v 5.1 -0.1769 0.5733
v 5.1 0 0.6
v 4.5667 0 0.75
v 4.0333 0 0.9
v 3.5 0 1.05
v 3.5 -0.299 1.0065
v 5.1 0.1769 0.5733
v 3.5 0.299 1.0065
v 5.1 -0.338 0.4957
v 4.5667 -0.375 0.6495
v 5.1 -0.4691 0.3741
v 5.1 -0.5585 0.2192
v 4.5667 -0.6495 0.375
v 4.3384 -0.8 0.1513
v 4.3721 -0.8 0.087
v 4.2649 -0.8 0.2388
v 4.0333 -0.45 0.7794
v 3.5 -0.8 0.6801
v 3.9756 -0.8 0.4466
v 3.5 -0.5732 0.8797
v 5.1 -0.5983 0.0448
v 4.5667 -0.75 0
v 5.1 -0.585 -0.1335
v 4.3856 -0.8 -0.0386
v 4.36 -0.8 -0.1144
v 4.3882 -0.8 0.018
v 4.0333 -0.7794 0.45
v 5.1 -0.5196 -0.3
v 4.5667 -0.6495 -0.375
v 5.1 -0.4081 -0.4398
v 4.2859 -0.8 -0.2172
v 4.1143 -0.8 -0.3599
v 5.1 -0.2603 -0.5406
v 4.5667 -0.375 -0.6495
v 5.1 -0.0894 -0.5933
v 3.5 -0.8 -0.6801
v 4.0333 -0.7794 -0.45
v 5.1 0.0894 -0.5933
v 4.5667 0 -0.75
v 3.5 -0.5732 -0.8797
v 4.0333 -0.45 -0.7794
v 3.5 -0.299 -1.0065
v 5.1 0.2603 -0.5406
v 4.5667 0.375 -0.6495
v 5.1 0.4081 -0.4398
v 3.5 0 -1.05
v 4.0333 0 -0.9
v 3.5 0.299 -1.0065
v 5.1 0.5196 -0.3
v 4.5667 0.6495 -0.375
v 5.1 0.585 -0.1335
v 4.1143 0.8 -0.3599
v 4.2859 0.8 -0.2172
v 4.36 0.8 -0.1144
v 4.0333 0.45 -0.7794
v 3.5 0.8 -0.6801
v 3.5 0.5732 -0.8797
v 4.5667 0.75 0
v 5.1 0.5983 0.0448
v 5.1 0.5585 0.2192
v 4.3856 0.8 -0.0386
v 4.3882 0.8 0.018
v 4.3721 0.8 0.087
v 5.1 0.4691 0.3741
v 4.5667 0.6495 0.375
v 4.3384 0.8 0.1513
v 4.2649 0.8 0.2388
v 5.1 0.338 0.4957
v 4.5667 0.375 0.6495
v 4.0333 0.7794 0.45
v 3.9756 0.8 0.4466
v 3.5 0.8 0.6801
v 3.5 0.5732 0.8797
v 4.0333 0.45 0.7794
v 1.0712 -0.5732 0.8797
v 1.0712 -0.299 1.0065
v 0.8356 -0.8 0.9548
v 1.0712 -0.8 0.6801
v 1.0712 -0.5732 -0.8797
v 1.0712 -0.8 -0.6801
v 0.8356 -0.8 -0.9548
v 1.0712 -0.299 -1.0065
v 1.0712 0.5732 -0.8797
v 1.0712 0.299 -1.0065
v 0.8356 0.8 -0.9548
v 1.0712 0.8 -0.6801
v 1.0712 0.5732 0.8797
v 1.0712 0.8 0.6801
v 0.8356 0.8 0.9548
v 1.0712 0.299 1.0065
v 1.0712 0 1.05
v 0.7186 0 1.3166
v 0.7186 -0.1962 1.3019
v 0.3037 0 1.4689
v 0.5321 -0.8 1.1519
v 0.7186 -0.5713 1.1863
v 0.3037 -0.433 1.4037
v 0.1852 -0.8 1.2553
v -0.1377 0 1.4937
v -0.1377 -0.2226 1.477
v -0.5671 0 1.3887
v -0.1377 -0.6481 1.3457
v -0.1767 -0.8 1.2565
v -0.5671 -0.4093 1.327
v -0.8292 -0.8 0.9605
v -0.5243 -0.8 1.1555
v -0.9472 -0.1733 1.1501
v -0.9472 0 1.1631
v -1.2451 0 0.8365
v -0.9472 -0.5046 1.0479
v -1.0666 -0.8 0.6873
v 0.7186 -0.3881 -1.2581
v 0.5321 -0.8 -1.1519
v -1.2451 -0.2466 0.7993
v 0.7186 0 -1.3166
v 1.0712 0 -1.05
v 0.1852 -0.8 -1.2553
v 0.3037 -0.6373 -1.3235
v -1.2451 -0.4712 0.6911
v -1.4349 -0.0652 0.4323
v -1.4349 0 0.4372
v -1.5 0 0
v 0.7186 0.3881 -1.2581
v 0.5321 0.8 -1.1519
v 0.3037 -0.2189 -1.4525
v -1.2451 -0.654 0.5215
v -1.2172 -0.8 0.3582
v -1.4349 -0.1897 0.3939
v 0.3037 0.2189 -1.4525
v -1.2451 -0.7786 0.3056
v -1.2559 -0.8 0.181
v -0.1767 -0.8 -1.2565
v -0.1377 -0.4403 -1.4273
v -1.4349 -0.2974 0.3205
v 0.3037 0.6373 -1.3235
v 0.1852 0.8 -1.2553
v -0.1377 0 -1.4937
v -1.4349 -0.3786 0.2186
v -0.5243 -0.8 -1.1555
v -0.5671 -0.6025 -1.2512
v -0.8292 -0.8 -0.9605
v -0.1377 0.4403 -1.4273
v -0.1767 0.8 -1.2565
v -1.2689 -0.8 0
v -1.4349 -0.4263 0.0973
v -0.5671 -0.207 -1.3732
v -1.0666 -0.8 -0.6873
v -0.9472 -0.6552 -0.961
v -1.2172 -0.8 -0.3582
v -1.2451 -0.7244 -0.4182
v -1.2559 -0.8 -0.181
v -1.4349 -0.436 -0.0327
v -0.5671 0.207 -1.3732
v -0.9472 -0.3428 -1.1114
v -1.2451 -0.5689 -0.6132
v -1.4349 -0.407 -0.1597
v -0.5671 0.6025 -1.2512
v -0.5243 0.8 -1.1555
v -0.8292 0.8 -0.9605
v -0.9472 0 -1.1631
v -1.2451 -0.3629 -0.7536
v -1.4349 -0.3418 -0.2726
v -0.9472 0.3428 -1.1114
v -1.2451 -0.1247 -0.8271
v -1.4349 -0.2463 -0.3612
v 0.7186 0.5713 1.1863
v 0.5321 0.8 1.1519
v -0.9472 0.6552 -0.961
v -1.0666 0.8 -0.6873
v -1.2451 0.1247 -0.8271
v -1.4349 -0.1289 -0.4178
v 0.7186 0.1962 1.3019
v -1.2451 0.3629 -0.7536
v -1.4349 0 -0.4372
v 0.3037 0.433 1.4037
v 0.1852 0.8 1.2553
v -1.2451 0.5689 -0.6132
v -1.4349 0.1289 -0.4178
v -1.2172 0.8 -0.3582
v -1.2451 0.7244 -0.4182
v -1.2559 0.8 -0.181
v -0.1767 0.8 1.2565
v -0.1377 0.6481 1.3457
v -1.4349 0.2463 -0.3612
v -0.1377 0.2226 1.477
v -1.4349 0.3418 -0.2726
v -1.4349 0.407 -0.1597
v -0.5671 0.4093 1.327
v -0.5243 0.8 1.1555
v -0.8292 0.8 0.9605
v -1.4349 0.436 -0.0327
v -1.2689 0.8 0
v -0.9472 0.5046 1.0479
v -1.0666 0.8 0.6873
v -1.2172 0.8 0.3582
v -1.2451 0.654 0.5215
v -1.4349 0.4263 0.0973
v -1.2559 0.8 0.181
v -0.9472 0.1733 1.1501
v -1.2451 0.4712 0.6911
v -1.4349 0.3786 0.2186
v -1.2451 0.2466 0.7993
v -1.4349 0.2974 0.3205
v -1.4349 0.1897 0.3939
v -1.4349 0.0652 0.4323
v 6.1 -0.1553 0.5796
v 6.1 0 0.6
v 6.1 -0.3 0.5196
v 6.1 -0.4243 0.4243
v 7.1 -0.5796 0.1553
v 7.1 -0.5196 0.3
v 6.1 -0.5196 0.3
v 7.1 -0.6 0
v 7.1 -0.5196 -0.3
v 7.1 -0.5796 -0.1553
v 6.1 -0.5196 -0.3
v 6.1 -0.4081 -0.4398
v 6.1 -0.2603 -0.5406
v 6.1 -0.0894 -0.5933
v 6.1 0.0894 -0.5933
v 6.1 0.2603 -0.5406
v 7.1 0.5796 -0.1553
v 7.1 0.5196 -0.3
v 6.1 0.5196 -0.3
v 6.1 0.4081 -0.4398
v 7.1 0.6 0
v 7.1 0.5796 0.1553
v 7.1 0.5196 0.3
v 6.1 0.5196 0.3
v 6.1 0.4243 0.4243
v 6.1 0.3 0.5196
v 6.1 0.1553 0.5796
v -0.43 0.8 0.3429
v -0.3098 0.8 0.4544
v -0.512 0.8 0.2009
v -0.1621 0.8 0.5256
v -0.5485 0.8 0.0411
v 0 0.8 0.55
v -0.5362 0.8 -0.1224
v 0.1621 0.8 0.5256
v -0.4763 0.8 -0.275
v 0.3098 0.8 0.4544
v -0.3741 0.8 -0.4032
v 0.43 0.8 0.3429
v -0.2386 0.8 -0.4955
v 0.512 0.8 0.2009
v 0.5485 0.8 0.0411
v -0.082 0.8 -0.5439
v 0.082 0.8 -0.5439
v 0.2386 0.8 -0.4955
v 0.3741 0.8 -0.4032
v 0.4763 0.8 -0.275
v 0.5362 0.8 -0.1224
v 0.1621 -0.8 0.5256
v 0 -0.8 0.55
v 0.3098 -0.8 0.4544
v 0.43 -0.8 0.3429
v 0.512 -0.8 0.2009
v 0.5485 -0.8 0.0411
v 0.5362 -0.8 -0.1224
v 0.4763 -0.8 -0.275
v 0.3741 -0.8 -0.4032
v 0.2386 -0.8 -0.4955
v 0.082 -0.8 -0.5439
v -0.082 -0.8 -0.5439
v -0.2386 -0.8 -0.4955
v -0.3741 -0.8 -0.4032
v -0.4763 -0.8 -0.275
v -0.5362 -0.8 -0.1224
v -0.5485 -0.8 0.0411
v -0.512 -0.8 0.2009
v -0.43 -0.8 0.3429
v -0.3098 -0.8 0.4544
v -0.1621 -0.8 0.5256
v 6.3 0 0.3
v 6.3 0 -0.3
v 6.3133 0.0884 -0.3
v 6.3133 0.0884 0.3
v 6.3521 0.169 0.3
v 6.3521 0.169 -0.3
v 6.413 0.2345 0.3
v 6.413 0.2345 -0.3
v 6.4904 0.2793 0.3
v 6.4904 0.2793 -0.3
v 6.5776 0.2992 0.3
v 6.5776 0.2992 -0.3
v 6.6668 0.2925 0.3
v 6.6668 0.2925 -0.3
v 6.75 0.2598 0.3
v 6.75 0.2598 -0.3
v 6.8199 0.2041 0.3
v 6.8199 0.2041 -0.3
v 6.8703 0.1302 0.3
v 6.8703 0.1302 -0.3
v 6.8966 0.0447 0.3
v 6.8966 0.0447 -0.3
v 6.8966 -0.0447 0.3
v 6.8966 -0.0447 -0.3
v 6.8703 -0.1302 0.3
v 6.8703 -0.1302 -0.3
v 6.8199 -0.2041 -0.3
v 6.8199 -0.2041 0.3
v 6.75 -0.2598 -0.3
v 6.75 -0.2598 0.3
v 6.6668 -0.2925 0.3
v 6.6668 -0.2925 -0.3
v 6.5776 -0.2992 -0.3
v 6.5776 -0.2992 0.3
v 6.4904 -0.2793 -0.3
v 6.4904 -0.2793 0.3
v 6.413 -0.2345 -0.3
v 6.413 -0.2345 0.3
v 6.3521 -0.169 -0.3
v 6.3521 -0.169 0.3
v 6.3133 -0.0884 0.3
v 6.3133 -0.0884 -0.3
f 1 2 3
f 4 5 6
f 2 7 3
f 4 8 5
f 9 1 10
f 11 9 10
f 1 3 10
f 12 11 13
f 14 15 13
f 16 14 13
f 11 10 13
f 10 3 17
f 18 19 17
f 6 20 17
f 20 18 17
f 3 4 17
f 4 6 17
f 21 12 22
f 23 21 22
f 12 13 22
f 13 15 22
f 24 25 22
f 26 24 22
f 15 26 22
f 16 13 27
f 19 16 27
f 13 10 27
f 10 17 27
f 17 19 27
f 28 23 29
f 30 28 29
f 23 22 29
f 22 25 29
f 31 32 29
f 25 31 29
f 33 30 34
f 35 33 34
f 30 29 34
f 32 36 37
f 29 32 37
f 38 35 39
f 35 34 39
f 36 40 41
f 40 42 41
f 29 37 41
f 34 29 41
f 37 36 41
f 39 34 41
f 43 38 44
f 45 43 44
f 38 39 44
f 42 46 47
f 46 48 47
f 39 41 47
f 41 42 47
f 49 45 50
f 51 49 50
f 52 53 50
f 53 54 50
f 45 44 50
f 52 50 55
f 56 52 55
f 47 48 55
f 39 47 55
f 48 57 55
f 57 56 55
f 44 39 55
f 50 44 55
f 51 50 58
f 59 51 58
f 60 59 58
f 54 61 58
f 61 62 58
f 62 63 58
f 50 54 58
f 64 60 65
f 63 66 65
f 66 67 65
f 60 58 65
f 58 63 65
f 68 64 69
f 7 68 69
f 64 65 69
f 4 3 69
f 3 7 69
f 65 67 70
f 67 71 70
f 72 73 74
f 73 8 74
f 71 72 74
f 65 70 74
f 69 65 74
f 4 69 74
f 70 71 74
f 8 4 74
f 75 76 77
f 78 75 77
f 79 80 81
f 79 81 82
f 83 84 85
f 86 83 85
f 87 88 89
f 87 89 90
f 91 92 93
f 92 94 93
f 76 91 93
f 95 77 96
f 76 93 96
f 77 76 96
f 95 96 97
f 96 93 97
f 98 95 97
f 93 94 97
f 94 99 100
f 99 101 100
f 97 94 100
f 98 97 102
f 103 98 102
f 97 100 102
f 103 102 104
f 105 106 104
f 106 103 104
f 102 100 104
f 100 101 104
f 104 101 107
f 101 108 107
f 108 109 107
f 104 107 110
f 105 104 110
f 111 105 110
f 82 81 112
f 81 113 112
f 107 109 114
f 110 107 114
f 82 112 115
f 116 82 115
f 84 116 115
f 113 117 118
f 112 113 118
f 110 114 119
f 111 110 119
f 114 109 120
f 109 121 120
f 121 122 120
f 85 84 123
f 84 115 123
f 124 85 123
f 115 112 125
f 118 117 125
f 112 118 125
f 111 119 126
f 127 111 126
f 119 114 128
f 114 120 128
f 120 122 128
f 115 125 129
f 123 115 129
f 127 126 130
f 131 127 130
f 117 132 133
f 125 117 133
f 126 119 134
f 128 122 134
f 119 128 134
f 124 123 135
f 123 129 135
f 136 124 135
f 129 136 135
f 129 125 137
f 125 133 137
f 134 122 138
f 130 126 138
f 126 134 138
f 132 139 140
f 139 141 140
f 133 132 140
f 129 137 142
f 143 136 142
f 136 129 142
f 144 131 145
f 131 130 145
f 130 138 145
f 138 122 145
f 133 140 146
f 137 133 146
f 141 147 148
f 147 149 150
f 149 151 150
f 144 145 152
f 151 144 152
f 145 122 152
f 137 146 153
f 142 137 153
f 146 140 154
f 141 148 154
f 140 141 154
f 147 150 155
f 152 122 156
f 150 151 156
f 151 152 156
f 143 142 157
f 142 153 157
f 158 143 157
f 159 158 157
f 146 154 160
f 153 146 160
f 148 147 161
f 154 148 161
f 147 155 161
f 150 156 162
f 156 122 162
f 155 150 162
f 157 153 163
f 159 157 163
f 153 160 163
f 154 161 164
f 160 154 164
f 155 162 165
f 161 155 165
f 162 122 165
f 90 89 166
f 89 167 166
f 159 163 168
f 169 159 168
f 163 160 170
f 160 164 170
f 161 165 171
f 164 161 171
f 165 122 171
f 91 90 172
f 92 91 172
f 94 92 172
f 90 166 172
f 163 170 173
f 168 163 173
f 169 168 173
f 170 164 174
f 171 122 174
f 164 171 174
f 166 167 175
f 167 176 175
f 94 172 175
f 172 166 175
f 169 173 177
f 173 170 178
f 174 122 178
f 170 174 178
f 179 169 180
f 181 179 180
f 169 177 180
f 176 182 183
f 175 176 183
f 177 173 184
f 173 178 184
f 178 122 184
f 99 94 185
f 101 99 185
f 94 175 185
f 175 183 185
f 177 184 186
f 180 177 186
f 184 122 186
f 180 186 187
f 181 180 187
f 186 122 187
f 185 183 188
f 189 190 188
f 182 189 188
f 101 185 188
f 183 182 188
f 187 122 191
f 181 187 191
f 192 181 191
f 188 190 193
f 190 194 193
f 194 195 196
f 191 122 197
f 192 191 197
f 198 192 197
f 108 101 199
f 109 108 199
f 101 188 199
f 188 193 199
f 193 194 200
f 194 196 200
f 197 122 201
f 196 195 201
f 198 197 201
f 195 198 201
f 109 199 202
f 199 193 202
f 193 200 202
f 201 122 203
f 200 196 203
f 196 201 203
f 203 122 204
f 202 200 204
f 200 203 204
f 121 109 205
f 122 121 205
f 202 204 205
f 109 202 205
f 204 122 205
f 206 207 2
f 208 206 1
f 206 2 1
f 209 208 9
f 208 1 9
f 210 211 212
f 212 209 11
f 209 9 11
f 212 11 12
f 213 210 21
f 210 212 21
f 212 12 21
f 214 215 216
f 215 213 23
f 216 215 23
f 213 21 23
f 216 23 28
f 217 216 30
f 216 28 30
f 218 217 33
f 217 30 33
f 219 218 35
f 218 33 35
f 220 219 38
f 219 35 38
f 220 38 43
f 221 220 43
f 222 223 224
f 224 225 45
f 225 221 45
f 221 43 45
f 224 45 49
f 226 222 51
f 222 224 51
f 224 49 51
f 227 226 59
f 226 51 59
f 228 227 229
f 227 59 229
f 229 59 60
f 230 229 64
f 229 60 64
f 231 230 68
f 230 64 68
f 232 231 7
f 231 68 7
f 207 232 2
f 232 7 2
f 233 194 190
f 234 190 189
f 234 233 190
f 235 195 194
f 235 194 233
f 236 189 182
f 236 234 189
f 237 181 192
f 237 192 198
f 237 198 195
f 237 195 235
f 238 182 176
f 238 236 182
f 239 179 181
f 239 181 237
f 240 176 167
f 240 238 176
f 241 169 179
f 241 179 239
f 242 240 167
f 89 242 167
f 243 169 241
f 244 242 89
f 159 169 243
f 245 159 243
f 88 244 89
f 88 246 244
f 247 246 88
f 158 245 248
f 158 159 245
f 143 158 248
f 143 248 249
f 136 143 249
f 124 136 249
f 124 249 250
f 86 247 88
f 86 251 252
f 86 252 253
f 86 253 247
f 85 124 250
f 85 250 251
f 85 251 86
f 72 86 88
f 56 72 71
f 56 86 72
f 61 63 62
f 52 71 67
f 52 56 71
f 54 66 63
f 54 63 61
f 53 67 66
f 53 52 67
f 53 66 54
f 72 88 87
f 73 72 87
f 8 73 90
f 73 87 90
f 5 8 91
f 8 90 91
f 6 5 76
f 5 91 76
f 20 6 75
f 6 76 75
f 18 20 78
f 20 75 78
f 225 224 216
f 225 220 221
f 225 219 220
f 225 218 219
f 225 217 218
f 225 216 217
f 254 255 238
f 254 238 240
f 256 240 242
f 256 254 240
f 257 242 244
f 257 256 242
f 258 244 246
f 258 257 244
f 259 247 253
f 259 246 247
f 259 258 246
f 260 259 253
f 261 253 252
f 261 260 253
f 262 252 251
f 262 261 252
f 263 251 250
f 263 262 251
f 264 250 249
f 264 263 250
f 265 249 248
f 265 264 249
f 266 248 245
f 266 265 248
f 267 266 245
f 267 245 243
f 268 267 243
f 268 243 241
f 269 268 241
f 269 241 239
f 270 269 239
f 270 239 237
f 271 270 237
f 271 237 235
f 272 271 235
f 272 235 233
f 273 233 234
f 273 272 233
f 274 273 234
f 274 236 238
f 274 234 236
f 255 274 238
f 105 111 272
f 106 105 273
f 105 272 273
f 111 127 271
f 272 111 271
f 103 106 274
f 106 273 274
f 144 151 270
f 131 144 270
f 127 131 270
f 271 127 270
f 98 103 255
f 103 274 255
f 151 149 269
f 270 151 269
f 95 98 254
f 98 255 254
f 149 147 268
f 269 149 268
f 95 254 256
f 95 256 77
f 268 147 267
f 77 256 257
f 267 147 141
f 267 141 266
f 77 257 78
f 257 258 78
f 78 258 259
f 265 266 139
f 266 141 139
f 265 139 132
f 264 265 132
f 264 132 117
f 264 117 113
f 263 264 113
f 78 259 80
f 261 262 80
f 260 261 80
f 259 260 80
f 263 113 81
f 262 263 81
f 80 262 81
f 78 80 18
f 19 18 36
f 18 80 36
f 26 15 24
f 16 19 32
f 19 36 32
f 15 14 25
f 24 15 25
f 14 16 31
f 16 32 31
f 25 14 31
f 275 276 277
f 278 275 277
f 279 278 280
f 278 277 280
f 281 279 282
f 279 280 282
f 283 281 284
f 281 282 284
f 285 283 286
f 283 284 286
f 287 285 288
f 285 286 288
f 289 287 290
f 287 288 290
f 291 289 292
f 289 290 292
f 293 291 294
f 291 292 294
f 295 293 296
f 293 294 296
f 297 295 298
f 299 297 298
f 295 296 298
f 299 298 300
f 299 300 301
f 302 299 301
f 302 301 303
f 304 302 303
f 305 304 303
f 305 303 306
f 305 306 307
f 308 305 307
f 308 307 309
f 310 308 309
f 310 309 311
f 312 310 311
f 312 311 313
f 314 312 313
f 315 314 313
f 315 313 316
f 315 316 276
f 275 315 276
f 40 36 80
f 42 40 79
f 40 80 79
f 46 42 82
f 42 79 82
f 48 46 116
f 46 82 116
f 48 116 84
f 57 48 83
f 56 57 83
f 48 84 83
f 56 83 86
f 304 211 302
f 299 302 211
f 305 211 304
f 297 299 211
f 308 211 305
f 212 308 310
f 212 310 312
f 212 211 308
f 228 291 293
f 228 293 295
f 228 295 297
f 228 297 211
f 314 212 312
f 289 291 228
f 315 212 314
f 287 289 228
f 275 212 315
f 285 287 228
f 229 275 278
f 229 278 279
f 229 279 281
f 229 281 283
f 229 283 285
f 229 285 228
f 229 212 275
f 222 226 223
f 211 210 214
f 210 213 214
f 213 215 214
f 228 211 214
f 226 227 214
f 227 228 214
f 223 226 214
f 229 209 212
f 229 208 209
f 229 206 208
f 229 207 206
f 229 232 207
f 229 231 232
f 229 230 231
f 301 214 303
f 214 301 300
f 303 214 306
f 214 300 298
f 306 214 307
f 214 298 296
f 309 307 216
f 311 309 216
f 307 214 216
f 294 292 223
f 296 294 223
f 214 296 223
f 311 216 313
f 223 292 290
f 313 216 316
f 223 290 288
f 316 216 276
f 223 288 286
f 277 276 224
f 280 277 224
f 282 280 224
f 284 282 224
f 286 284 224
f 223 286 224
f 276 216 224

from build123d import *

# Parameters (mm, degrees)
CUT_EXTRUDE_START         = -1.5
CUT_EXTRUDE_1_OUTLINE_W   = 9
CUT_EXTRUDE_1_OUTLINE_H   = 6
CUT_EXTRUDE_1_DEPTH       = 0.7
CUT_EXTRUDE_START_2       = 0.8
CUT_EXTRUDE_1_2_OUTLINE_W = 9
CUT_EXTRUDE_1_2_OUTLINE_H = 6
CUT_EXTRUDE_1_2_DEPTH     = 0.7
CUT_EXTRUDE_2_DEPTH       = 8.431016081
CUT_EXTRUDE_2_DEPTH_BACK  = 8.431016081
SKETCH_4_R                = 0.55
CUT_EXTRUDE_3_DEPTH       = 9.766413178
CUT_EXTRUDE_3_DEPTH_BACK  = 1
SKETCH_5_OUTSIDE_W        = 6.85
SKETCH_5_OUTSIDE_H        = 5.45
SKETCH_5_OUTSIDE_W_2      = 0.6
SKETCH_5_OUTSIDE_H_2      = 3.351666402
SKETCH_7_R                = 0.3
CUT_EXTRUDE_5_DEPTH       = 8.368174808


# Read off the part's stored shape, not the designer's step: 切除-拉伸1
with BuildPart() as part:
    # 草图2 → 旋转1 (revolve)
    with BuildSketch(Plane(origin=(0, 0, 0), x_dir=(1, 0, 0), z_dir=(0, 1, 0)), mode=Mode.PRIVATE) as revolve_1_sk:
        with BuildLine():
            ThreePointArc((1.5, 0), (1.388672279, 0.567088443), (1.071214264, 1.05))
            ThreePointArc((1.071214264, 1.05), (-0.567088443, 1.388672279), (-1.5, 0))
            Line((-1.5, 0), (1.5, 0))
        make_face()
        with BuildLine():
            Line((3.5, 1.05), (1.071214264, 1.05))
            ThreePointArc((1.071214264, 1.05), (1.388672279, 0.567088443), (1.5, 0))
            Line((1.5, 0), (7.1, 0))
            Line((7.1, 0), (7.1, 0.6))
            Line((7.1, 0.6), (5.1, 0.6))
            Line((5.1, 0.6), (3.5, 1.05))
        make_face()
    revolve(revolve_1_sk.sketch.rotate(Axis((7.1, 0, 0), (1, 0, 0)), 180), axis=Axis((7.1, 0, 0), (1, 0, 0)))

    # 切除-拉伸1 outline → 切除-拉伸1 (cut)
    with BuildSketch(Plane(origin=(0, 0, 0), x_dir=(1, 0, 0), z_dir=(0, 1, 0)).offset(CUT_EXTRUDE_START)):
        with Locations((1.5, 0)):
            Rectangle(CUT_EXTRUDE_1_OUTLINE_W, CUT_EXTRUDE_1_OUTLINE_H)
    extrude(amount=CUT_EXTRUDE_1_DEPTH, mode=Mode.SUBTRACT)

    # Cut-Extrude 1 2 outline → Cut-Extrude 1 2 (cut)
    with BuildSketch(Plane(origin=(0, 0, 0), x_dir=(1, 0, 0), z_dir=(0, 1, 0)).offset(CUT_EXTRUDE_START_2)):
        with Locations((1.5, 0)):
            Rectangle(CUT_EXTRUDE_1_2_OUTLINE_W, CUT_EXTRUDE_1_2_OUTLINE_H)
    extrude(amount=CUT_EXTRUDE_1_2_DEPTH, mode=Mode.SUBTRACT)

    # 草图4 → 切除-拉伸2 (cut, two sides: drawn at the far end of the back side and taken through both)
    with BuildSketch(Plane(origin=(0, 0.8, 0), x_dir=(1, 0, 0), z_dir=(0, 1, 0)).offset(-CUT_EXTRUDE_2_DEPTH_BACK)):
        with Locations(Location((0, 0, 0), (0, 0, 270))):
            Circle(SKETCH_4_R)
    extrude(amount=CUT_EXTRUDE_2_DEPTH + CUT_EXTRUDE_2_DEPTH_BACK, mode=Mode.SUBTRACT)

    # 草图5 outside → 切除-拉伸3 (cut, two sides: drawn at the far end of the back side and taken through both)
    with BuildSketch(Plane(origin=(7.1, 0, 0), x_dir=(0, 0, -1), z_dir=(1, 0, 0)).offset(-CUT_EXTRUDE_3_DEPTH_BACK)):
        Rectangle(SKETCH_5_OUTSIDE_W, SKETCH_5_OUTSIDE_H)
        Rectangle(SKETCH_5_OUTSIDE_W_2, SKETCH_5_OUTSIDE_H_2, mode=Mode.SUBTRACT)
    extrude(amount=CUT_EXTRUDE_3_DEPTH + CUT_EXTRUDE_3_DEPTH_BACK, mode=Mode.SUBTRACT)

    # 草图7 → 切除-拉伸5 (cut, through all)
    with BuildSketch(Plane(origin=(0, 0, -0.3), x_dir=(-1, 0, 0), z_dir=(0, 0, -1))):
        with Locations((-6.6, 0)):
            Circle(SKETCH_7_R)
    extrude(amount=-CUT_EXTRUDE_5_DEPTH, mode=Mode.SUBTRACT)


solid = part.part
